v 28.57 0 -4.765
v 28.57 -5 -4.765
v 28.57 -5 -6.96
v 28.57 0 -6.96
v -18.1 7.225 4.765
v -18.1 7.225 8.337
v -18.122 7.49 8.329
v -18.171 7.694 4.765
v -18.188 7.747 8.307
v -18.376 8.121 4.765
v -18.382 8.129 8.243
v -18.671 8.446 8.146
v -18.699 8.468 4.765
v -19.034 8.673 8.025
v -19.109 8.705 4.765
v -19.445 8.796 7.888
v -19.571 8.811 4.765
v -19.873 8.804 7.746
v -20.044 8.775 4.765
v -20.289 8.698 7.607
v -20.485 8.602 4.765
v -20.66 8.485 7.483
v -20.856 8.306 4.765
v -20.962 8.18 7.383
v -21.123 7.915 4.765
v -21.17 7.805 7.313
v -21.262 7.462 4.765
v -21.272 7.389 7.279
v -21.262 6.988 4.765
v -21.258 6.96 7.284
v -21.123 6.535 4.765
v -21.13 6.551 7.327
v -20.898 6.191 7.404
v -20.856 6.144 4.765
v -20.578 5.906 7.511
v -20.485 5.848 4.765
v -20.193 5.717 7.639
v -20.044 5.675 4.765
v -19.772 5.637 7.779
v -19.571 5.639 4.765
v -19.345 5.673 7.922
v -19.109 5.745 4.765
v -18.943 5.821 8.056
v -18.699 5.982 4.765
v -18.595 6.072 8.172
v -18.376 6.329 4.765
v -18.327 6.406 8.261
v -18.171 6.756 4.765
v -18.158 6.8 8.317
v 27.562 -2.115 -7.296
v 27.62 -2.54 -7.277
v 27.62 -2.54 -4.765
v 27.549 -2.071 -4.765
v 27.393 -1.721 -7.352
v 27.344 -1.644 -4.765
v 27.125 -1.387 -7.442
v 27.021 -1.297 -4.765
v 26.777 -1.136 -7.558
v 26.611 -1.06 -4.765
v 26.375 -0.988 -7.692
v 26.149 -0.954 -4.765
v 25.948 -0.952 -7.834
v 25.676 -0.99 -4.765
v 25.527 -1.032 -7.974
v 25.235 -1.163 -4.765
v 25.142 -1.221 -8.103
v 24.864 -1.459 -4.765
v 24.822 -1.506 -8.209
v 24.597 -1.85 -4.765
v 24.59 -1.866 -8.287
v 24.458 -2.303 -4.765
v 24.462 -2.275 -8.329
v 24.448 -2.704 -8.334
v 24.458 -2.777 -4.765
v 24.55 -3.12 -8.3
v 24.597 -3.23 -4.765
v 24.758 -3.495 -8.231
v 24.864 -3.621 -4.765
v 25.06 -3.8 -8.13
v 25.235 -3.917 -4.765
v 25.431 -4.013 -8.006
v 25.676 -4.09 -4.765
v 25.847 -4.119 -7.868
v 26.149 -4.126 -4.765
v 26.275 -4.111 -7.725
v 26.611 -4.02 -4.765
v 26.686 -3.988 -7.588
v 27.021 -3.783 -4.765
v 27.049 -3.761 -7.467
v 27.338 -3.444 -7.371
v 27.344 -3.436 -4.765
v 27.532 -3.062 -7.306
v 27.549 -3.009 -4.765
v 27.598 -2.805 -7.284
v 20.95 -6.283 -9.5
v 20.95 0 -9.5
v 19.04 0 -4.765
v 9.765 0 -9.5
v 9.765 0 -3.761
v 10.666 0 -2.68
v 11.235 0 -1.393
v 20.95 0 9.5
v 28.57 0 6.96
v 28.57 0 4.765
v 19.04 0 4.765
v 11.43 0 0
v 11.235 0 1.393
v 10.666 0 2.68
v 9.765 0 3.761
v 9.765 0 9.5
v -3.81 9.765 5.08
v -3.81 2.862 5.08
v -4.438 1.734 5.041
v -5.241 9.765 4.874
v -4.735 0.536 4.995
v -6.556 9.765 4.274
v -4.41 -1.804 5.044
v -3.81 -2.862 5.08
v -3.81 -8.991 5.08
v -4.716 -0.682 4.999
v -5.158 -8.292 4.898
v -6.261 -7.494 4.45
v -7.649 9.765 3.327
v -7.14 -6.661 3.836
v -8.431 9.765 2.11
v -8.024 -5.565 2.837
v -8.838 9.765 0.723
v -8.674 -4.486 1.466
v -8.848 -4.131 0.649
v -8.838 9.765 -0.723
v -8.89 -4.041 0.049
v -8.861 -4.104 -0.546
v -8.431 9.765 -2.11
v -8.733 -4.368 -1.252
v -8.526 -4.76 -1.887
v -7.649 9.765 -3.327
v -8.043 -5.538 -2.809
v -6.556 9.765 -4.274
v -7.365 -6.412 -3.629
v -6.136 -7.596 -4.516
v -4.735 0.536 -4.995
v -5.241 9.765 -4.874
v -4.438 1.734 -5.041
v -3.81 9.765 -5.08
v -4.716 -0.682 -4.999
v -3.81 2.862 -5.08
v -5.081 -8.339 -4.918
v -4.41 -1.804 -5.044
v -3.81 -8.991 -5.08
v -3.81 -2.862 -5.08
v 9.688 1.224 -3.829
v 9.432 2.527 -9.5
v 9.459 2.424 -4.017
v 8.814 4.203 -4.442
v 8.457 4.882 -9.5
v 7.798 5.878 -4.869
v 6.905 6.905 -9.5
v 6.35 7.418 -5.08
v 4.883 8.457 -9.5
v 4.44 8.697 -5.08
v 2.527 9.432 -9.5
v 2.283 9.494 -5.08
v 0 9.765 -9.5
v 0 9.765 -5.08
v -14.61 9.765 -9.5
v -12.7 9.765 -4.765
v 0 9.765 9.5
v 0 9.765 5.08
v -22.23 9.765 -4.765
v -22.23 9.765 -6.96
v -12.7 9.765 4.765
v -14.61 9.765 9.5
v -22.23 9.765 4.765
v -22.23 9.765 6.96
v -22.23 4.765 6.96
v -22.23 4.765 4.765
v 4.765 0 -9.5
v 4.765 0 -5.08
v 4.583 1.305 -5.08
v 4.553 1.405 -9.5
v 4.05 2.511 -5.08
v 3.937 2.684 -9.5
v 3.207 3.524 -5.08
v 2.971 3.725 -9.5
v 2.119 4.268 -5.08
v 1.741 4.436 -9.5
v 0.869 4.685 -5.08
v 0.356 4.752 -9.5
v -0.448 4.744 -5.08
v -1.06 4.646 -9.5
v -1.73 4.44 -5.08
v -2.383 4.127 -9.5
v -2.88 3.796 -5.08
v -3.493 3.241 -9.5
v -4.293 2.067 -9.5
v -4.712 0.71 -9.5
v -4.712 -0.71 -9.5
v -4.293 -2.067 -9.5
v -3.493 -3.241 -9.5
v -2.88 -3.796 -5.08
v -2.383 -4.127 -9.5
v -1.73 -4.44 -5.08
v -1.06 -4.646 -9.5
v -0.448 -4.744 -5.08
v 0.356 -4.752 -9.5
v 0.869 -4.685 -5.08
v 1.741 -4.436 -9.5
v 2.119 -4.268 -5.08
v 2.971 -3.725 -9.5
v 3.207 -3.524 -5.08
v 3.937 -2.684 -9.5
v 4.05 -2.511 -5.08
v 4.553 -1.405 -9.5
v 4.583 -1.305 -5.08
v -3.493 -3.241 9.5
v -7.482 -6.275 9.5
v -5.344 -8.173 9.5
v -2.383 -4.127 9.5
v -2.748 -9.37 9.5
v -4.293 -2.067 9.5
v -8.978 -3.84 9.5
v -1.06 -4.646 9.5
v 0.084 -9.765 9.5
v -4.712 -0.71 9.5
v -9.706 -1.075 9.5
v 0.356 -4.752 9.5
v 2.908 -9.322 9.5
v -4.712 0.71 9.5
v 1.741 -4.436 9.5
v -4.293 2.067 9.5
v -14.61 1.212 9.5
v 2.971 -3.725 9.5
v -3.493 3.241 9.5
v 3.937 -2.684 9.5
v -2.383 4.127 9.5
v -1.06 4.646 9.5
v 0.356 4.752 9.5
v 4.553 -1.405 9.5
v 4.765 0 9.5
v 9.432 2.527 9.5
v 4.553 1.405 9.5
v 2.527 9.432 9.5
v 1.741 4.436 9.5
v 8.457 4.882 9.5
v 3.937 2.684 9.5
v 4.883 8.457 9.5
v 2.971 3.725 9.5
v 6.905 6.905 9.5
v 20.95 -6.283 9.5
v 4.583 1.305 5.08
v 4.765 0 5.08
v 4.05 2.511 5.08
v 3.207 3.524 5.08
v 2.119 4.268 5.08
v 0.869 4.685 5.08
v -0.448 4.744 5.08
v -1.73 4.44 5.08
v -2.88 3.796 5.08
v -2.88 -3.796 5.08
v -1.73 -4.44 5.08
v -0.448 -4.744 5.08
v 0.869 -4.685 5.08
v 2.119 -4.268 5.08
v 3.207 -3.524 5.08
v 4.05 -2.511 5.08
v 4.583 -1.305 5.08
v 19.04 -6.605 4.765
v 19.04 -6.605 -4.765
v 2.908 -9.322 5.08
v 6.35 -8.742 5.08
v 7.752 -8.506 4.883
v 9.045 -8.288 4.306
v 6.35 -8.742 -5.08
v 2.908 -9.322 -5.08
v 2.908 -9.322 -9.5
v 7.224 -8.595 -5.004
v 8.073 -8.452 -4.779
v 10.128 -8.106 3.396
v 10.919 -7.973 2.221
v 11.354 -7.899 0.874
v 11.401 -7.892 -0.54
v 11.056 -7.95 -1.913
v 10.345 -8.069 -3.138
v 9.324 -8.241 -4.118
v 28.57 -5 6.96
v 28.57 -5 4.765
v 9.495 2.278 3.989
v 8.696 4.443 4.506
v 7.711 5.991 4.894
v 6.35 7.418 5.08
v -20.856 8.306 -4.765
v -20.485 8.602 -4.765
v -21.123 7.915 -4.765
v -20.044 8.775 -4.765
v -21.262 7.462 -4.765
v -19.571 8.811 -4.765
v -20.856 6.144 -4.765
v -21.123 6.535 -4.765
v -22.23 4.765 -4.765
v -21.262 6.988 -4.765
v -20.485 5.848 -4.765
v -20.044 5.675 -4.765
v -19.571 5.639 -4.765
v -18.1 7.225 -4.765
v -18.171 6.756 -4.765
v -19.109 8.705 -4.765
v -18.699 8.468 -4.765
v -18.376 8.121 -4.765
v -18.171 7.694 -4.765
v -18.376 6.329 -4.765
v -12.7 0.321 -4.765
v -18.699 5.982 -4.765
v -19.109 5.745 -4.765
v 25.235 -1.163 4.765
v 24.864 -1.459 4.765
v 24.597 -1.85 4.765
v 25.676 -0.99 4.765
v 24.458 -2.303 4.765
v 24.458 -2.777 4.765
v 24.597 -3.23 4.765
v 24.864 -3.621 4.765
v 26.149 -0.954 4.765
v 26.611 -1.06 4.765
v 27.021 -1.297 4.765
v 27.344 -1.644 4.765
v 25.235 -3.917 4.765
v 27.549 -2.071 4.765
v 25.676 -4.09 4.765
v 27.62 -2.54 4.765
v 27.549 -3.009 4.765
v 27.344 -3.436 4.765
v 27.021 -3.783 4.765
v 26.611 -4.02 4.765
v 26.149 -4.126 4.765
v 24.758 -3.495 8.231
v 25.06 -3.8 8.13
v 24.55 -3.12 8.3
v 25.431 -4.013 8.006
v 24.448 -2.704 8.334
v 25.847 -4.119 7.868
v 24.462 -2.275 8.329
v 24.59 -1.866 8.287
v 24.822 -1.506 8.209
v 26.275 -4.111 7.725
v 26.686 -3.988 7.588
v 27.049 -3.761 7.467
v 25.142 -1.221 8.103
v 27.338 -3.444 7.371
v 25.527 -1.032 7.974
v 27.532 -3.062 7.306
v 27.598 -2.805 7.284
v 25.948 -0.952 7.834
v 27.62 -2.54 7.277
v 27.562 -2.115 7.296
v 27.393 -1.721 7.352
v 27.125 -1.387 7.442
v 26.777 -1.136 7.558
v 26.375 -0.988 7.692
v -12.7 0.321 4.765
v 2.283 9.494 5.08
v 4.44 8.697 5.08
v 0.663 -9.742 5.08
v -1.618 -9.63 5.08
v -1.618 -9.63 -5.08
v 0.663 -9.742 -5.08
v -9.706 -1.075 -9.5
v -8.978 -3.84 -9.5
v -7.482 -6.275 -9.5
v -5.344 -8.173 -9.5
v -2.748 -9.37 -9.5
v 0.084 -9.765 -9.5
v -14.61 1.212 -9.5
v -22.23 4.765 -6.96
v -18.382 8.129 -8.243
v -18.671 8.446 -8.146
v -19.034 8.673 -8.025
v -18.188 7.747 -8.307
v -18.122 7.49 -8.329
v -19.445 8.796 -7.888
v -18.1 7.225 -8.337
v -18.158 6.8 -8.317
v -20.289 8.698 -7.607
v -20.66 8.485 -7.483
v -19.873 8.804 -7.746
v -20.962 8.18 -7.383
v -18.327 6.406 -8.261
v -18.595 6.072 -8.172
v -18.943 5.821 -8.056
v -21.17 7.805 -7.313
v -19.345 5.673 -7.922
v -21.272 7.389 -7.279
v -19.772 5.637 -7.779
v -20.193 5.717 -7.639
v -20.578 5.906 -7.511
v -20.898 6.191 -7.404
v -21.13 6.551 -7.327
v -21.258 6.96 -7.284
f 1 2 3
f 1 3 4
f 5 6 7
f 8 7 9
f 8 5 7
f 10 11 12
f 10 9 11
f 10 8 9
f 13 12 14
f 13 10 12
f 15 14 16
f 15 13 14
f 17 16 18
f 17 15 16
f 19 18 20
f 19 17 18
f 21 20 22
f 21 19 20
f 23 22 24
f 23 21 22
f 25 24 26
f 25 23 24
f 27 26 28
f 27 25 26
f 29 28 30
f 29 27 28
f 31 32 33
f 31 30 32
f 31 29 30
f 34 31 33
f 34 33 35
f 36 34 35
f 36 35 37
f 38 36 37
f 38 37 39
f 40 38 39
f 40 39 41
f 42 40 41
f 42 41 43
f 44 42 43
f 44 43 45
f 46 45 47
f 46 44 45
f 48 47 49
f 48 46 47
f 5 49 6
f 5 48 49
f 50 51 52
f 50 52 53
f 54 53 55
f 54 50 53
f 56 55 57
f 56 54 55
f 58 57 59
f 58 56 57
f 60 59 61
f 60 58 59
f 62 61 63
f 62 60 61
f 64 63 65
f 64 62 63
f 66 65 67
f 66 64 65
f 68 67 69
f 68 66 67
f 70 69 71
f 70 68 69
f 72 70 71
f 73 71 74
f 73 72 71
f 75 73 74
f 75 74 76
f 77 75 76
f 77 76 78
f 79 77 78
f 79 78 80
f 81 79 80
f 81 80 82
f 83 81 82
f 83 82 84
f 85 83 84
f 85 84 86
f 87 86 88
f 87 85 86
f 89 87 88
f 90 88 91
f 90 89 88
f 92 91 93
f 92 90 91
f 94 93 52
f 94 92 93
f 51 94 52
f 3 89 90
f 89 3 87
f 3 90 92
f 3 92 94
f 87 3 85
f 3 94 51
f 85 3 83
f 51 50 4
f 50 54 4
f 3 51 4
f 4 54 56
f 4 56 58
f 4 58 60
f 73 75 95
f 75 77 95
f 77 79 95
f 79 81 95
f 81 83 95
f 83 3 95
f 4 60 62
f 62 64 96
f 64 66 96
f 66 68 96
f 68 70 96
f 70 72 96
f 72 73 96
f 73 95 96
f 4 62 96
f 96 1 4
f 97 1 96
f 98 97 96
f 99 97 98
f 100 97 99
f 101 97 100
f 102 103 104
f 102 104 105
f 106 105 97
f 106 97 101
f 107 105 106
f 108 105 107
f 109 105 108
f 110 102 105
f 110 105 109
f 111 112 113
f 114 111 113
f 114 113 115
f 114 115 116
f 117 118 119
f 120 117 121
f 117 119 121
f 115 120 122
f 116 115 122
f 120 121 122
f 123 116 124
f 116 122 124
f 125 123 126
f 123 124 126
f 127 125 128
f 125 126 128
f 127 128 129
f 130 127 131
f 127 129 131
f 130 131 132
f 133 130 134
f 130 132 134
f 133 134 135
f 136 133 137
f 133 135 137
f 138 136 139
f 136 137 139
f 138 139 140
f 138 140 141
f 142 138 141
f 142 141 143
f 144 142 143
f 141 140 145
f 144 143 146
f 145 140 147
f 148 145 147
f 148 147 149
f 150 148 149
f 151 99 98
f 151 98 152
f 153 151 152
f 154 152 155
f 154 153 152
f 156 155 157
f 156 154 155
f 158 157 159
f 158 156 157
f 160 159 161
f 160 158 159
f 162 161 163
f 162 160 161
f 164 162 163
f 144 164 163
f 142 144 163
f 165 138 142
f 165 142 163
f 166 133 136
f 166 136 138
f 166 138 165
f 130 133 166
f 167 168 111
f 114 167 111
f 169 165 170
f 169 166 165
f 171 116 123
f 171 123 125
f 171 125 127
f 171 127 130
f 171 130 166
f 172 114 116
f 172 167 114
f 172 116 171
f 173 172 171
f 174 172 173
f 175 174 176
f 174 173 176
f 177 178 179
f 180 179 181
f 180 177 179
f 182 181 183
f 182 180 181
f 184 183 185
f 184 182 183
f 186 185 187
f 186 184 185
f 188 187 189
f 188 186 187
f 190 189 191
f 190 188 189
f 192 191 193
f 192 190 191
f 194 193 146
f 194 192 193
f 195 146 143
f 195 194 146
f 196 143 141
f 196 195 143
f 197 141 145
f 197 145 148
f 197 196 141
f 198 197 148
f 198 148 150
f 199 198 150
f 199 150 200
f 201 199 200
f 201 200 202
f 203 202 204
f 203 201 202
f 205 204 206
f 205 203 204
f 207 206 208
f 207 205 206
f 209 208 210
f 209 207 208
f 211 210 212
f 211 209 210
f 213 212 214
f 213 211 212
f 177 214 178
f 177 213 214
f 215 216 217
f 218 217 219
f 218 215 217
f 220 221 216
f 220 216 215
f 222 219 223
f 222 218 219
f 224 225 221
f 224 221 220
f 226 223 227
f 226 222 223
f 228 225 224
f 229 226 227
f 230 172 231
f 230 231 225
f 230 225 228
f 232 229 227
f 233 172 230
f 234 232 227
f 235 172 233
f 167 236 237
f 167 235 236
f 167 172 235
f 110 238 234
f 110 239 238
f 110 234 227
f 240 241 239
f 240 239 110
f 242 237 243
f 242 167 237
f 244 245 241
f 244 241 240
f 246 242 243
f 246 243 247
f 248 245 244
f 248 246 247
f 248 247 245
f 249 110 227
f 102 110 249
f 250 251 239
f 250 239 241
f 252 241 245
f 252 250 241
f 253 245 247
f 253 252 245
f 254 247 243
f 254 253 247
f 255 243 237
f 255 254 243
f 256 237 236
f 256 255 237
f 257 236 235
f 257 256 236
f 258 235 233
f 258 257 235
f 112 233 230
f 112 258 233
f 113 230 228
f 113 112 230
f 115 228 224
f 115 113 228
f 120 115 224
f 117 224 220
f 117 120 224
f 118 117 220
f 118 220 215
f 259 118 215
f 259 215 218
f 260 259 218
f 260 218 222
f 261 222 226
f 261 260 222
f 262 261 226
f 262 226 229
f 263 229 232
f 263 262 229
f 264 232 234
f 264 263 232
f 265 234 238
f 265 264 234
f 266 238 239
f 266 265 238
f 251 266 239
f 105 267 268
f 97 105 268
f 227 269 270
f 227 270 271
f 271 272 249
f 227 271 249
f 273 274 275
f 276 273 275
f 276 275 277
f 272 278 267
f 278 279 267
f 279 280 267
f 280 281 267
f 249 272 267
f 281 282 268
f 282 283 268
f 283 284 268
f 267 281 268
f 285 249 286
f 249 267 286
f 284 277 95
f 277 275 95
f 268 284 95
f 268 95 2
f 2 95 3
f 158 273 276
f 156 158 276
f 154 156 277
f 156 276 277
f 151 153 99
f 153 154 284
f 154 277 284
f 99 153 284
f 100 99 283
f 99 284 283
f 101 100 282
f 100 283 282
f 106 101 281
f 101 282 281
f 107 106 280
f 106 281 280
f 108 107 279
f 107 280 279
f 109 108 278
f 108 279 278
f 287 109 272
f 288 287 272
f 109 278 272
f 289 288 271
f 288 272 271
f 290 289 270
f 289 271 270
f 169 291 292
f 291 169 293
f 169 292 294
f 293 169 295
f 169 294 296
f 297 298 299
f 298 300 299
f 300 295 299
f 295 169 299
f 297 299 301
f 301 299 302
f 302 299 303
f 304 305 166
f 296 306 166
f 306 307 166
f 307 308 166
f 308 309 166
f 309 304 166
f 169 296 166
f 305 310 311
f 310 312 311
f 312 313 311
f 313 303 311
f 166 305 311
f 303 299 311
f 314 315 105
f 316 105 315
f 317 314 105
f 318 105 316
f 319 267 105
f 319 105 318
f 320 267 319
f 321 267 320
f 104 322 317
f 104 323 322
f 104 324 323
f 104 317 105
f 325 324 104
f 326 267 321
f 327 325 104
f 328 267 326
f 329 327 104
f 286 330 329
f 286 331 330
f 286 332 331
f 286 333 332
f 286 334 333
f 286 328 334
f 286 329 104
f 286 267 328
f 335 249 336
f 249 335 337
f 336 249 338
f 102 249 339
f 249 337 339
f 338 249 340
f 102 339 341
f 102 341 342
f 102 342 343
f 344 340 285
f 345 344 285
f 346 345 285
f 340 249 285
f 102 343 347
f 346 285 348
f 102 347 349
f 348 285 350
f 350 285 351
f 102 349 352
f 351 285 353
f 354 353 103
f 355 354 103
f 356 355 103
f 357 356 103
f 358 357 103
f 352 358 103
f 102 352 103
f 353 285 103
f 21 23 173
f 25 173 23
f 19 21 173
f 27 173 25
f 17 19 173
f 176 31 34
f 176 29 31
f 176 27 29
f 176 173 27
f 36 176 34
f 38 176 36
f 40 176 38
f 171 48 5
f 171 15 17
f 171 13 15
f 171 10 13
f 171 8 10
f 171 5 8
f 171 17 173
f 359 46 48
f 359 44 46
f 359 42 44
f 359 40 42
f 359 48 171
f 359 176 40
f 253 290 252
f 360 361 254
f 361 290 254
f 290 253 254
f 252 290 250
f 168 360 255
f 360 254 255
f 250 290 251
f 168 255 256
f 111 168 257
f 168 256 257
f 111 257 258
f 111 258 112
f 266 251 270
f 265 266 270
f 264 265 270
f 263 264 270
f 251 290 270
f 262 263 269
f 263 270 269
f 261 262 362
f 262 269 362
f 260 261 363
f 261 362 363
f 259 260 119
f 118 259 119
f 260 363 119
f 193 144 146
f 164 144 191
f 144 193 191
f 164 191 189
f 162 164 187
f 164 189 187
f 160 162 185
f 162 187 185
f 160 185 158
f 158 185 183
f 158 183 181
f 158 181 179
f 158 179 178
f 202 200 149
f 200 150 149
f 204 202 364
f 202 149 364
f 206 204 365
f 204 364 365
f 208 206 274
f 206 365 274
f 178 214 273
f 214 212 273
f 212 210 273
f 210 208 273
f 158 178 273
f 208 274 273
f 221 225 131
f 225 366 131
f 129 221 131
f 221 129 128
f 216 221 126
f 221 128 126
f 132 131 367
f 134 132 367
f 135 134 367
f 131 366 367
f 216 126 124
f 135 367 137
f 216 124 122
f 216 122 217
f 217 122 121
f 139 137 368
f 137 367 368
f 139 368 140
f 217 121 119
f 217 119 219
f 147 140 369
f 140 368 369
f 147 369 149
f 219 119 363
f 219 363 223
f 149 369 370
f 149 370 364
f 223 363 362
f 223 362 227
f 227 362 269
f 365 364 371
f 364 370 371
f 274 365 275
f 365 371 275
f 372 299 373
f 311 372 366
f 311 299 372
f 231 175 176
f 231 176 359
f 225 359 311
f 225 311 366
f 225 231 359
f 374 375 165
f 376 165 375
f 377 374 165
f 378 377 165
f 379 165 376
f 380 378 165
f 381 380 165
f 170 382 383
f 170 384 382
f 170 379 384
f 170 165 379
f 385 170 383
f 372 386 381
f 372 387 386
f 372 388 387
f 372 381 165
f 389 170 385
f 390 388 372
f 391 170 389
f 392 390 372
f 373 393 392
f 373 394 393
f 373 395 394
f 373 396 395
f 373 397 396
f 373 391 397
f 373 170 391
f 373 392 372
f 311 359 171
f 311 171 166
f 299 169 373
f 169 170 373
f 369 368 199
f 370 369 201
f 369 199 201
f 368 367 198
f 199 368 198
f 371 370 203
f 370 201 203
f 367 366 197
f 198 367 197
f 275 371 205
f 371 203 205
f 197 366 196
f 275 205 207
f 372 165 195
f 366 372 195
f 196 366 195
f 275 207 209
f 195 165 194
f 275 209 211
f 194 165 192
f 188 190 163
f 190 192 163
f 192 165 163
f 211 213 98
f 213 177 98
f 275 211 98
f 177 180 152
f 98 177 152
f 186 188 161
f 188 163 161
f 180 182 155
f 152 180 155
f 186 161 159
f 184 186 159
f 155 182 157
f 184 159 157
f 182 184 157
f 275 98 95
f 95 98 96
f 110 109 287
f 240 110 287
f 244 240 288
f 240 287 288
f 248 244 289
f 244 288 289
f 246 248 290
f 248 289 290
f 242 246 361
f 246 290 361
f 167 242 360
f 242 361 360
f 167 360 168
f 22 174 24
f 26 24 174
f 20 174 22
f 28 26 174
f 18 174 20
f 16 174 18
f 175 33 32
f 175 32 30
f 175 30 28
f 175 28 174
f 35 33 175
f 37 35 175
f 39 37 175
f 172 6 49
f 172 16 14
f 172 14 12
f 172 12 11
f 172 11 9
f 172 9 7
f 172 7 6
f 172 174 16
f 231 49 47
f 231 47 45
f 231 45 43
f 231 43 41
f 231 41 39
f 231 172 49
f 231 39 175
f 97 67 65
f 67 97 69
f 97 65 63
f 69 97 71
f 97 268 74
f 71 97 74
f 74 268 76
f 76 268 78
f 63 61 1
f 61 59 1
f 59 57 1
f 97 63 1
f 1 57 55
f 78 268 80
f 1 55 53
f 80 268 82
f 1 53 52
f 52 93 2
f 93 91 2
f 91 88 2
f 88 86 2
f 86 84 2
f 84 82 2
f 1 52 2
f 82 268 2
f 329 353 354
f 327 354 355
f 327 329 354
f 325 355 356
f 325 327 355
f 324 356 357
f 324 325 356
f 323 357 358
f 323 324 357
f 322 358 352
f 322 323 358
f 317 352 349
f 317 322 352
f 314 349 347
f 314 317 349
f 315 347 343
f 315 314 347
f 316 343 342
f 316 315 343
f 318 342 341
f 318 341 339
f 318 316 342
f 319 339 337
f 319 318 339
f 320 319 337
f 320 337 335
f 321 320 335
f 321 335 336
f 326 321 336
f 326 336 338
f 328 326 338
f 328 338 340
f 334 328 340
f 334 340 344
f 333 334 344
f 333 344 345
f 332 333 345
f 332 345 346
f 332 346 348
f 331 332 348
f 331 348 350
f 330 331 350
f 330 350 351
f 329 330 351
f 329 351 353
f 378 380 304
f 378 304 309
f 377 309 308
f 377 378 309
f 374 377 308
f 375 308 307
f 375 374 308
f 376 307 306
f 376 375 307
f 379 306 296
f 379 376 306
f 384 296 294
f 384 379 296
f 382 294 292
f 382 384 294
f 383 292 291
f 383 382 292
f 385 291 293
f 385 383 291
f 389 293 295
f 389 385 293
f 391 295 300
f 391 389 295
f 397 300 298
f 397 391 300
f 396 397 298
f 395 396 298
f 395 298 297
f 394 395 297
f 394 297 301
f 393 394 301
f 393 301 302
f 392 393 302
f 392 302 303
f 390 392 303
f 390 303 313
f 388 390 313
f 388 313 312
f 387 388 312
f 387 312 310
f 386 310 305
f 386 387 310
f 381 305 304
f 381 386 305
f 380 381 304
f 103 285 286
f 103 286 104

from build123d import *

# Parameters (mm, degrees)
SKETCH1_R               = 9.765
SKETCH1_R_2             = 4.765
BOSS_EXTRUDE1_DEPTH     = 9.5
CHAMFER1_SIZE           = 2.54
CHAMFER1_SIZE2          = 7.62
CHAMFER2_SIZE           = 7.62
CHAMFER2_SIZE2          = 2.54
CHAMFER3_SIZE           = 7.62
CHAMFER3_SIZE2          = 2.54
CHAMFER4_SIZE           = 2.54
CHAMFER4_SIZE2          = 7.62
CUT_EXTRUDE1_DEPTH      = 32.652016129
CUT_EXTRUDE1_DEPTH_BACK = 32.652016129
CUT_EXTRUDE2_DEPTH      = 32.652016189
CUT_EXTRUDE2_DEPTH_BACK = 32.652016189
SKETCH4_W               = 9.53
SKETCH4_H               = 9.53
CUT_EXTRUDE3_DEPTH      = 32.652016189
CUT_EXTRUDE3_DEPTH_BACK = 32.652016189
SKETCH5_R               = 1.59


with BuildPart() as part:
    # Sketch1 → Boss-Extrude1 (new, symmetric)
    # profile 1 of 3: a face of its own
    with BuildSketch(Plane.XY):
        with BuildLine():
            ThreePointArc((-9.705624325, -1.075212291), (-7.275117629, 6.513669357), (0, 9.765))
            Line((0, 9.765), (-22.23, 9.765))
            Line((-22.23, 9.765), (-22.23, 4.765))
            Line((-22.23, 4.765), (-9.705624325, -1.075212291))
        make_face()
    # profile 2 of 3: a face of its own
    with BuildSketch(Plane.XY):
        Circle(SKETCH1_R)
        Circle(SKETCH1_R_2, mode=Mode.SUBTRACT)
    # profile 3 of 3: a face of its own
    with BuildSketch(Plane.XY):
        with BuildLine():
            Line((28.57, 0), (9.765, 0))
            ThreePointArc((9.765, 0), (7.866135596, -5.786115777), (2.908034147, -9.321939841))
            Line((2.908034147, -9.321939841), (28.57, -5))
            Line((28.57, -5), (28.57, 0))
        make_face()
    extrude(amount=BOSS_EXTRUDE1_DEPTH, both=True)

    # Chamfer1
    chamfer1_edges = [part.edges().sort_by_distance(p)[0] for p in [
        (-22.23, 7.265, 9.5),
    ]]
    chamfer1_side = [part.faces().sort_by_distance(p)[0] for p in [
        (-22.23, 7.265, 0),
    ]]
    chamfer(chamfer1_edges, length=CHAMFER1_SIZE, length2=CHAMFER1_SIZE2, reference=chamfer1_side[0])

    # Chamfer2
    chamfer2_edges = [part.edges().sort_by_distance(p)[0] for p in [
        (-22.23, 7.265, -9.5),
    ]]
    chamfer2_side = [part.faces().sort_by_distance(p)[0] for p in [
        (-11.115, 9.220751812, -9.5),
    ]]
    chamfer(chamfer2_edges, length=CHAMFER2_SIZE, length2=CHAMFER2_SIZE2, reference=chamfer2_side[0])

    # Chamfer3
    chamfer3_edges = [part.edges().sort_by_distance(p)[0] for p in [
        (28.57, -2.5, 9.5),
    ]]
    chamfer3_side = [part.faces().sort_by_distance(p)[0] for p in [
        (-7.305, 9.291087213, 9.5),
    ]]
    chamfer(chamfer3_edges, length=CHAMFER3_SIZE, length2=CHAMFER3_SIZE2, reference=chamfer3_side[0])

    # Chamfer4
    chamfer4_edges = [part.edges().sort_by_distance(p)[0] for p in [
        (28.57, -2.5, -9.5),
    ]]
    chamfer4_side = [part.faces().sort_by_distance(p)[0] for p in [
        (28.57, -2.5, -1.27),
    ]]
    chamfer(chamfer4_edges, length=CHAMFER4_SIZE, length2=CHAMFER4_SIZE2, reference=chamfer4_side[0])

    # Sketch3 → Cut-Extrude1 (cut, two sides: drawn at the far end of the back side and taken through both)
    with BuildSketch(Plane(origin=(0, 0, 0), x_dir=(1, 0, 0), z_dir=(0, 1, 0)).offset(-CUT_EXTRUDE1_DEPTH_BACK)):
        with BuildLine():
            Line((-3.81, 5.08), (6.35, 5.08))
            ThreePointArc((6.35, 5.08), (11.43, 0), (6.35, -5.08))
            Line((6.35, -5.08), (-3.81, -5.08))
            ThreePointArc((-3.81, -5.08), (-8.89, 0), (-3.81, 5.08))
        make_face()
    extrude(amount=CUT_EXTRUDE1_DEPTH + CUT_EXTRUDE1_DEPTH_BACK, mode=Mode.SUBTRACT)

    # Sketch4 → Cut-Extrude2 (cut, two sides: drawn at the far end of the back side and taken through both)
    with BuildSketch(Plane(origin=(0, 0, 0), x_dir=(1, 0, 0), z_dir=(0, 1, 0)).offset(-CUT_EXTRUDE2_DEPTH_BACK)):
        with Locations((-17.465, 0)):
            Rectangle(SKETCH4_W, SKETCH4_H)
        with Locations((23.805, 0)):
            Rectangle(SKETCH4_W, SKETCH4_H)
    extrude(amount=CUT_EXTRUDE2_DEPTH + CUT_EXTRUDE2_DEPTH_BACK, mode=Mode.SUBTRACT)

    # Sketch5 → Cut-Extrude3 (cut, two sides: drawn at the far end of the back side and taken through both)
    with BuildSketch(Plane.XY.offset(-CUT_EXTRUDE3_DEPTH_BACK)):
        with Locations((26.03, -2.54)):
            Circle(SKETCH5_R)
        with Locations((-19.69, 7.225)):
            Circle(SKETCH5_R)
    extrude(amount=CUT_EXTRUDE3_DEPTH + CUT_EXTRUDE3_DEPTH_BACK, mode=Mode.SUBTRACT)


solid = part.part
